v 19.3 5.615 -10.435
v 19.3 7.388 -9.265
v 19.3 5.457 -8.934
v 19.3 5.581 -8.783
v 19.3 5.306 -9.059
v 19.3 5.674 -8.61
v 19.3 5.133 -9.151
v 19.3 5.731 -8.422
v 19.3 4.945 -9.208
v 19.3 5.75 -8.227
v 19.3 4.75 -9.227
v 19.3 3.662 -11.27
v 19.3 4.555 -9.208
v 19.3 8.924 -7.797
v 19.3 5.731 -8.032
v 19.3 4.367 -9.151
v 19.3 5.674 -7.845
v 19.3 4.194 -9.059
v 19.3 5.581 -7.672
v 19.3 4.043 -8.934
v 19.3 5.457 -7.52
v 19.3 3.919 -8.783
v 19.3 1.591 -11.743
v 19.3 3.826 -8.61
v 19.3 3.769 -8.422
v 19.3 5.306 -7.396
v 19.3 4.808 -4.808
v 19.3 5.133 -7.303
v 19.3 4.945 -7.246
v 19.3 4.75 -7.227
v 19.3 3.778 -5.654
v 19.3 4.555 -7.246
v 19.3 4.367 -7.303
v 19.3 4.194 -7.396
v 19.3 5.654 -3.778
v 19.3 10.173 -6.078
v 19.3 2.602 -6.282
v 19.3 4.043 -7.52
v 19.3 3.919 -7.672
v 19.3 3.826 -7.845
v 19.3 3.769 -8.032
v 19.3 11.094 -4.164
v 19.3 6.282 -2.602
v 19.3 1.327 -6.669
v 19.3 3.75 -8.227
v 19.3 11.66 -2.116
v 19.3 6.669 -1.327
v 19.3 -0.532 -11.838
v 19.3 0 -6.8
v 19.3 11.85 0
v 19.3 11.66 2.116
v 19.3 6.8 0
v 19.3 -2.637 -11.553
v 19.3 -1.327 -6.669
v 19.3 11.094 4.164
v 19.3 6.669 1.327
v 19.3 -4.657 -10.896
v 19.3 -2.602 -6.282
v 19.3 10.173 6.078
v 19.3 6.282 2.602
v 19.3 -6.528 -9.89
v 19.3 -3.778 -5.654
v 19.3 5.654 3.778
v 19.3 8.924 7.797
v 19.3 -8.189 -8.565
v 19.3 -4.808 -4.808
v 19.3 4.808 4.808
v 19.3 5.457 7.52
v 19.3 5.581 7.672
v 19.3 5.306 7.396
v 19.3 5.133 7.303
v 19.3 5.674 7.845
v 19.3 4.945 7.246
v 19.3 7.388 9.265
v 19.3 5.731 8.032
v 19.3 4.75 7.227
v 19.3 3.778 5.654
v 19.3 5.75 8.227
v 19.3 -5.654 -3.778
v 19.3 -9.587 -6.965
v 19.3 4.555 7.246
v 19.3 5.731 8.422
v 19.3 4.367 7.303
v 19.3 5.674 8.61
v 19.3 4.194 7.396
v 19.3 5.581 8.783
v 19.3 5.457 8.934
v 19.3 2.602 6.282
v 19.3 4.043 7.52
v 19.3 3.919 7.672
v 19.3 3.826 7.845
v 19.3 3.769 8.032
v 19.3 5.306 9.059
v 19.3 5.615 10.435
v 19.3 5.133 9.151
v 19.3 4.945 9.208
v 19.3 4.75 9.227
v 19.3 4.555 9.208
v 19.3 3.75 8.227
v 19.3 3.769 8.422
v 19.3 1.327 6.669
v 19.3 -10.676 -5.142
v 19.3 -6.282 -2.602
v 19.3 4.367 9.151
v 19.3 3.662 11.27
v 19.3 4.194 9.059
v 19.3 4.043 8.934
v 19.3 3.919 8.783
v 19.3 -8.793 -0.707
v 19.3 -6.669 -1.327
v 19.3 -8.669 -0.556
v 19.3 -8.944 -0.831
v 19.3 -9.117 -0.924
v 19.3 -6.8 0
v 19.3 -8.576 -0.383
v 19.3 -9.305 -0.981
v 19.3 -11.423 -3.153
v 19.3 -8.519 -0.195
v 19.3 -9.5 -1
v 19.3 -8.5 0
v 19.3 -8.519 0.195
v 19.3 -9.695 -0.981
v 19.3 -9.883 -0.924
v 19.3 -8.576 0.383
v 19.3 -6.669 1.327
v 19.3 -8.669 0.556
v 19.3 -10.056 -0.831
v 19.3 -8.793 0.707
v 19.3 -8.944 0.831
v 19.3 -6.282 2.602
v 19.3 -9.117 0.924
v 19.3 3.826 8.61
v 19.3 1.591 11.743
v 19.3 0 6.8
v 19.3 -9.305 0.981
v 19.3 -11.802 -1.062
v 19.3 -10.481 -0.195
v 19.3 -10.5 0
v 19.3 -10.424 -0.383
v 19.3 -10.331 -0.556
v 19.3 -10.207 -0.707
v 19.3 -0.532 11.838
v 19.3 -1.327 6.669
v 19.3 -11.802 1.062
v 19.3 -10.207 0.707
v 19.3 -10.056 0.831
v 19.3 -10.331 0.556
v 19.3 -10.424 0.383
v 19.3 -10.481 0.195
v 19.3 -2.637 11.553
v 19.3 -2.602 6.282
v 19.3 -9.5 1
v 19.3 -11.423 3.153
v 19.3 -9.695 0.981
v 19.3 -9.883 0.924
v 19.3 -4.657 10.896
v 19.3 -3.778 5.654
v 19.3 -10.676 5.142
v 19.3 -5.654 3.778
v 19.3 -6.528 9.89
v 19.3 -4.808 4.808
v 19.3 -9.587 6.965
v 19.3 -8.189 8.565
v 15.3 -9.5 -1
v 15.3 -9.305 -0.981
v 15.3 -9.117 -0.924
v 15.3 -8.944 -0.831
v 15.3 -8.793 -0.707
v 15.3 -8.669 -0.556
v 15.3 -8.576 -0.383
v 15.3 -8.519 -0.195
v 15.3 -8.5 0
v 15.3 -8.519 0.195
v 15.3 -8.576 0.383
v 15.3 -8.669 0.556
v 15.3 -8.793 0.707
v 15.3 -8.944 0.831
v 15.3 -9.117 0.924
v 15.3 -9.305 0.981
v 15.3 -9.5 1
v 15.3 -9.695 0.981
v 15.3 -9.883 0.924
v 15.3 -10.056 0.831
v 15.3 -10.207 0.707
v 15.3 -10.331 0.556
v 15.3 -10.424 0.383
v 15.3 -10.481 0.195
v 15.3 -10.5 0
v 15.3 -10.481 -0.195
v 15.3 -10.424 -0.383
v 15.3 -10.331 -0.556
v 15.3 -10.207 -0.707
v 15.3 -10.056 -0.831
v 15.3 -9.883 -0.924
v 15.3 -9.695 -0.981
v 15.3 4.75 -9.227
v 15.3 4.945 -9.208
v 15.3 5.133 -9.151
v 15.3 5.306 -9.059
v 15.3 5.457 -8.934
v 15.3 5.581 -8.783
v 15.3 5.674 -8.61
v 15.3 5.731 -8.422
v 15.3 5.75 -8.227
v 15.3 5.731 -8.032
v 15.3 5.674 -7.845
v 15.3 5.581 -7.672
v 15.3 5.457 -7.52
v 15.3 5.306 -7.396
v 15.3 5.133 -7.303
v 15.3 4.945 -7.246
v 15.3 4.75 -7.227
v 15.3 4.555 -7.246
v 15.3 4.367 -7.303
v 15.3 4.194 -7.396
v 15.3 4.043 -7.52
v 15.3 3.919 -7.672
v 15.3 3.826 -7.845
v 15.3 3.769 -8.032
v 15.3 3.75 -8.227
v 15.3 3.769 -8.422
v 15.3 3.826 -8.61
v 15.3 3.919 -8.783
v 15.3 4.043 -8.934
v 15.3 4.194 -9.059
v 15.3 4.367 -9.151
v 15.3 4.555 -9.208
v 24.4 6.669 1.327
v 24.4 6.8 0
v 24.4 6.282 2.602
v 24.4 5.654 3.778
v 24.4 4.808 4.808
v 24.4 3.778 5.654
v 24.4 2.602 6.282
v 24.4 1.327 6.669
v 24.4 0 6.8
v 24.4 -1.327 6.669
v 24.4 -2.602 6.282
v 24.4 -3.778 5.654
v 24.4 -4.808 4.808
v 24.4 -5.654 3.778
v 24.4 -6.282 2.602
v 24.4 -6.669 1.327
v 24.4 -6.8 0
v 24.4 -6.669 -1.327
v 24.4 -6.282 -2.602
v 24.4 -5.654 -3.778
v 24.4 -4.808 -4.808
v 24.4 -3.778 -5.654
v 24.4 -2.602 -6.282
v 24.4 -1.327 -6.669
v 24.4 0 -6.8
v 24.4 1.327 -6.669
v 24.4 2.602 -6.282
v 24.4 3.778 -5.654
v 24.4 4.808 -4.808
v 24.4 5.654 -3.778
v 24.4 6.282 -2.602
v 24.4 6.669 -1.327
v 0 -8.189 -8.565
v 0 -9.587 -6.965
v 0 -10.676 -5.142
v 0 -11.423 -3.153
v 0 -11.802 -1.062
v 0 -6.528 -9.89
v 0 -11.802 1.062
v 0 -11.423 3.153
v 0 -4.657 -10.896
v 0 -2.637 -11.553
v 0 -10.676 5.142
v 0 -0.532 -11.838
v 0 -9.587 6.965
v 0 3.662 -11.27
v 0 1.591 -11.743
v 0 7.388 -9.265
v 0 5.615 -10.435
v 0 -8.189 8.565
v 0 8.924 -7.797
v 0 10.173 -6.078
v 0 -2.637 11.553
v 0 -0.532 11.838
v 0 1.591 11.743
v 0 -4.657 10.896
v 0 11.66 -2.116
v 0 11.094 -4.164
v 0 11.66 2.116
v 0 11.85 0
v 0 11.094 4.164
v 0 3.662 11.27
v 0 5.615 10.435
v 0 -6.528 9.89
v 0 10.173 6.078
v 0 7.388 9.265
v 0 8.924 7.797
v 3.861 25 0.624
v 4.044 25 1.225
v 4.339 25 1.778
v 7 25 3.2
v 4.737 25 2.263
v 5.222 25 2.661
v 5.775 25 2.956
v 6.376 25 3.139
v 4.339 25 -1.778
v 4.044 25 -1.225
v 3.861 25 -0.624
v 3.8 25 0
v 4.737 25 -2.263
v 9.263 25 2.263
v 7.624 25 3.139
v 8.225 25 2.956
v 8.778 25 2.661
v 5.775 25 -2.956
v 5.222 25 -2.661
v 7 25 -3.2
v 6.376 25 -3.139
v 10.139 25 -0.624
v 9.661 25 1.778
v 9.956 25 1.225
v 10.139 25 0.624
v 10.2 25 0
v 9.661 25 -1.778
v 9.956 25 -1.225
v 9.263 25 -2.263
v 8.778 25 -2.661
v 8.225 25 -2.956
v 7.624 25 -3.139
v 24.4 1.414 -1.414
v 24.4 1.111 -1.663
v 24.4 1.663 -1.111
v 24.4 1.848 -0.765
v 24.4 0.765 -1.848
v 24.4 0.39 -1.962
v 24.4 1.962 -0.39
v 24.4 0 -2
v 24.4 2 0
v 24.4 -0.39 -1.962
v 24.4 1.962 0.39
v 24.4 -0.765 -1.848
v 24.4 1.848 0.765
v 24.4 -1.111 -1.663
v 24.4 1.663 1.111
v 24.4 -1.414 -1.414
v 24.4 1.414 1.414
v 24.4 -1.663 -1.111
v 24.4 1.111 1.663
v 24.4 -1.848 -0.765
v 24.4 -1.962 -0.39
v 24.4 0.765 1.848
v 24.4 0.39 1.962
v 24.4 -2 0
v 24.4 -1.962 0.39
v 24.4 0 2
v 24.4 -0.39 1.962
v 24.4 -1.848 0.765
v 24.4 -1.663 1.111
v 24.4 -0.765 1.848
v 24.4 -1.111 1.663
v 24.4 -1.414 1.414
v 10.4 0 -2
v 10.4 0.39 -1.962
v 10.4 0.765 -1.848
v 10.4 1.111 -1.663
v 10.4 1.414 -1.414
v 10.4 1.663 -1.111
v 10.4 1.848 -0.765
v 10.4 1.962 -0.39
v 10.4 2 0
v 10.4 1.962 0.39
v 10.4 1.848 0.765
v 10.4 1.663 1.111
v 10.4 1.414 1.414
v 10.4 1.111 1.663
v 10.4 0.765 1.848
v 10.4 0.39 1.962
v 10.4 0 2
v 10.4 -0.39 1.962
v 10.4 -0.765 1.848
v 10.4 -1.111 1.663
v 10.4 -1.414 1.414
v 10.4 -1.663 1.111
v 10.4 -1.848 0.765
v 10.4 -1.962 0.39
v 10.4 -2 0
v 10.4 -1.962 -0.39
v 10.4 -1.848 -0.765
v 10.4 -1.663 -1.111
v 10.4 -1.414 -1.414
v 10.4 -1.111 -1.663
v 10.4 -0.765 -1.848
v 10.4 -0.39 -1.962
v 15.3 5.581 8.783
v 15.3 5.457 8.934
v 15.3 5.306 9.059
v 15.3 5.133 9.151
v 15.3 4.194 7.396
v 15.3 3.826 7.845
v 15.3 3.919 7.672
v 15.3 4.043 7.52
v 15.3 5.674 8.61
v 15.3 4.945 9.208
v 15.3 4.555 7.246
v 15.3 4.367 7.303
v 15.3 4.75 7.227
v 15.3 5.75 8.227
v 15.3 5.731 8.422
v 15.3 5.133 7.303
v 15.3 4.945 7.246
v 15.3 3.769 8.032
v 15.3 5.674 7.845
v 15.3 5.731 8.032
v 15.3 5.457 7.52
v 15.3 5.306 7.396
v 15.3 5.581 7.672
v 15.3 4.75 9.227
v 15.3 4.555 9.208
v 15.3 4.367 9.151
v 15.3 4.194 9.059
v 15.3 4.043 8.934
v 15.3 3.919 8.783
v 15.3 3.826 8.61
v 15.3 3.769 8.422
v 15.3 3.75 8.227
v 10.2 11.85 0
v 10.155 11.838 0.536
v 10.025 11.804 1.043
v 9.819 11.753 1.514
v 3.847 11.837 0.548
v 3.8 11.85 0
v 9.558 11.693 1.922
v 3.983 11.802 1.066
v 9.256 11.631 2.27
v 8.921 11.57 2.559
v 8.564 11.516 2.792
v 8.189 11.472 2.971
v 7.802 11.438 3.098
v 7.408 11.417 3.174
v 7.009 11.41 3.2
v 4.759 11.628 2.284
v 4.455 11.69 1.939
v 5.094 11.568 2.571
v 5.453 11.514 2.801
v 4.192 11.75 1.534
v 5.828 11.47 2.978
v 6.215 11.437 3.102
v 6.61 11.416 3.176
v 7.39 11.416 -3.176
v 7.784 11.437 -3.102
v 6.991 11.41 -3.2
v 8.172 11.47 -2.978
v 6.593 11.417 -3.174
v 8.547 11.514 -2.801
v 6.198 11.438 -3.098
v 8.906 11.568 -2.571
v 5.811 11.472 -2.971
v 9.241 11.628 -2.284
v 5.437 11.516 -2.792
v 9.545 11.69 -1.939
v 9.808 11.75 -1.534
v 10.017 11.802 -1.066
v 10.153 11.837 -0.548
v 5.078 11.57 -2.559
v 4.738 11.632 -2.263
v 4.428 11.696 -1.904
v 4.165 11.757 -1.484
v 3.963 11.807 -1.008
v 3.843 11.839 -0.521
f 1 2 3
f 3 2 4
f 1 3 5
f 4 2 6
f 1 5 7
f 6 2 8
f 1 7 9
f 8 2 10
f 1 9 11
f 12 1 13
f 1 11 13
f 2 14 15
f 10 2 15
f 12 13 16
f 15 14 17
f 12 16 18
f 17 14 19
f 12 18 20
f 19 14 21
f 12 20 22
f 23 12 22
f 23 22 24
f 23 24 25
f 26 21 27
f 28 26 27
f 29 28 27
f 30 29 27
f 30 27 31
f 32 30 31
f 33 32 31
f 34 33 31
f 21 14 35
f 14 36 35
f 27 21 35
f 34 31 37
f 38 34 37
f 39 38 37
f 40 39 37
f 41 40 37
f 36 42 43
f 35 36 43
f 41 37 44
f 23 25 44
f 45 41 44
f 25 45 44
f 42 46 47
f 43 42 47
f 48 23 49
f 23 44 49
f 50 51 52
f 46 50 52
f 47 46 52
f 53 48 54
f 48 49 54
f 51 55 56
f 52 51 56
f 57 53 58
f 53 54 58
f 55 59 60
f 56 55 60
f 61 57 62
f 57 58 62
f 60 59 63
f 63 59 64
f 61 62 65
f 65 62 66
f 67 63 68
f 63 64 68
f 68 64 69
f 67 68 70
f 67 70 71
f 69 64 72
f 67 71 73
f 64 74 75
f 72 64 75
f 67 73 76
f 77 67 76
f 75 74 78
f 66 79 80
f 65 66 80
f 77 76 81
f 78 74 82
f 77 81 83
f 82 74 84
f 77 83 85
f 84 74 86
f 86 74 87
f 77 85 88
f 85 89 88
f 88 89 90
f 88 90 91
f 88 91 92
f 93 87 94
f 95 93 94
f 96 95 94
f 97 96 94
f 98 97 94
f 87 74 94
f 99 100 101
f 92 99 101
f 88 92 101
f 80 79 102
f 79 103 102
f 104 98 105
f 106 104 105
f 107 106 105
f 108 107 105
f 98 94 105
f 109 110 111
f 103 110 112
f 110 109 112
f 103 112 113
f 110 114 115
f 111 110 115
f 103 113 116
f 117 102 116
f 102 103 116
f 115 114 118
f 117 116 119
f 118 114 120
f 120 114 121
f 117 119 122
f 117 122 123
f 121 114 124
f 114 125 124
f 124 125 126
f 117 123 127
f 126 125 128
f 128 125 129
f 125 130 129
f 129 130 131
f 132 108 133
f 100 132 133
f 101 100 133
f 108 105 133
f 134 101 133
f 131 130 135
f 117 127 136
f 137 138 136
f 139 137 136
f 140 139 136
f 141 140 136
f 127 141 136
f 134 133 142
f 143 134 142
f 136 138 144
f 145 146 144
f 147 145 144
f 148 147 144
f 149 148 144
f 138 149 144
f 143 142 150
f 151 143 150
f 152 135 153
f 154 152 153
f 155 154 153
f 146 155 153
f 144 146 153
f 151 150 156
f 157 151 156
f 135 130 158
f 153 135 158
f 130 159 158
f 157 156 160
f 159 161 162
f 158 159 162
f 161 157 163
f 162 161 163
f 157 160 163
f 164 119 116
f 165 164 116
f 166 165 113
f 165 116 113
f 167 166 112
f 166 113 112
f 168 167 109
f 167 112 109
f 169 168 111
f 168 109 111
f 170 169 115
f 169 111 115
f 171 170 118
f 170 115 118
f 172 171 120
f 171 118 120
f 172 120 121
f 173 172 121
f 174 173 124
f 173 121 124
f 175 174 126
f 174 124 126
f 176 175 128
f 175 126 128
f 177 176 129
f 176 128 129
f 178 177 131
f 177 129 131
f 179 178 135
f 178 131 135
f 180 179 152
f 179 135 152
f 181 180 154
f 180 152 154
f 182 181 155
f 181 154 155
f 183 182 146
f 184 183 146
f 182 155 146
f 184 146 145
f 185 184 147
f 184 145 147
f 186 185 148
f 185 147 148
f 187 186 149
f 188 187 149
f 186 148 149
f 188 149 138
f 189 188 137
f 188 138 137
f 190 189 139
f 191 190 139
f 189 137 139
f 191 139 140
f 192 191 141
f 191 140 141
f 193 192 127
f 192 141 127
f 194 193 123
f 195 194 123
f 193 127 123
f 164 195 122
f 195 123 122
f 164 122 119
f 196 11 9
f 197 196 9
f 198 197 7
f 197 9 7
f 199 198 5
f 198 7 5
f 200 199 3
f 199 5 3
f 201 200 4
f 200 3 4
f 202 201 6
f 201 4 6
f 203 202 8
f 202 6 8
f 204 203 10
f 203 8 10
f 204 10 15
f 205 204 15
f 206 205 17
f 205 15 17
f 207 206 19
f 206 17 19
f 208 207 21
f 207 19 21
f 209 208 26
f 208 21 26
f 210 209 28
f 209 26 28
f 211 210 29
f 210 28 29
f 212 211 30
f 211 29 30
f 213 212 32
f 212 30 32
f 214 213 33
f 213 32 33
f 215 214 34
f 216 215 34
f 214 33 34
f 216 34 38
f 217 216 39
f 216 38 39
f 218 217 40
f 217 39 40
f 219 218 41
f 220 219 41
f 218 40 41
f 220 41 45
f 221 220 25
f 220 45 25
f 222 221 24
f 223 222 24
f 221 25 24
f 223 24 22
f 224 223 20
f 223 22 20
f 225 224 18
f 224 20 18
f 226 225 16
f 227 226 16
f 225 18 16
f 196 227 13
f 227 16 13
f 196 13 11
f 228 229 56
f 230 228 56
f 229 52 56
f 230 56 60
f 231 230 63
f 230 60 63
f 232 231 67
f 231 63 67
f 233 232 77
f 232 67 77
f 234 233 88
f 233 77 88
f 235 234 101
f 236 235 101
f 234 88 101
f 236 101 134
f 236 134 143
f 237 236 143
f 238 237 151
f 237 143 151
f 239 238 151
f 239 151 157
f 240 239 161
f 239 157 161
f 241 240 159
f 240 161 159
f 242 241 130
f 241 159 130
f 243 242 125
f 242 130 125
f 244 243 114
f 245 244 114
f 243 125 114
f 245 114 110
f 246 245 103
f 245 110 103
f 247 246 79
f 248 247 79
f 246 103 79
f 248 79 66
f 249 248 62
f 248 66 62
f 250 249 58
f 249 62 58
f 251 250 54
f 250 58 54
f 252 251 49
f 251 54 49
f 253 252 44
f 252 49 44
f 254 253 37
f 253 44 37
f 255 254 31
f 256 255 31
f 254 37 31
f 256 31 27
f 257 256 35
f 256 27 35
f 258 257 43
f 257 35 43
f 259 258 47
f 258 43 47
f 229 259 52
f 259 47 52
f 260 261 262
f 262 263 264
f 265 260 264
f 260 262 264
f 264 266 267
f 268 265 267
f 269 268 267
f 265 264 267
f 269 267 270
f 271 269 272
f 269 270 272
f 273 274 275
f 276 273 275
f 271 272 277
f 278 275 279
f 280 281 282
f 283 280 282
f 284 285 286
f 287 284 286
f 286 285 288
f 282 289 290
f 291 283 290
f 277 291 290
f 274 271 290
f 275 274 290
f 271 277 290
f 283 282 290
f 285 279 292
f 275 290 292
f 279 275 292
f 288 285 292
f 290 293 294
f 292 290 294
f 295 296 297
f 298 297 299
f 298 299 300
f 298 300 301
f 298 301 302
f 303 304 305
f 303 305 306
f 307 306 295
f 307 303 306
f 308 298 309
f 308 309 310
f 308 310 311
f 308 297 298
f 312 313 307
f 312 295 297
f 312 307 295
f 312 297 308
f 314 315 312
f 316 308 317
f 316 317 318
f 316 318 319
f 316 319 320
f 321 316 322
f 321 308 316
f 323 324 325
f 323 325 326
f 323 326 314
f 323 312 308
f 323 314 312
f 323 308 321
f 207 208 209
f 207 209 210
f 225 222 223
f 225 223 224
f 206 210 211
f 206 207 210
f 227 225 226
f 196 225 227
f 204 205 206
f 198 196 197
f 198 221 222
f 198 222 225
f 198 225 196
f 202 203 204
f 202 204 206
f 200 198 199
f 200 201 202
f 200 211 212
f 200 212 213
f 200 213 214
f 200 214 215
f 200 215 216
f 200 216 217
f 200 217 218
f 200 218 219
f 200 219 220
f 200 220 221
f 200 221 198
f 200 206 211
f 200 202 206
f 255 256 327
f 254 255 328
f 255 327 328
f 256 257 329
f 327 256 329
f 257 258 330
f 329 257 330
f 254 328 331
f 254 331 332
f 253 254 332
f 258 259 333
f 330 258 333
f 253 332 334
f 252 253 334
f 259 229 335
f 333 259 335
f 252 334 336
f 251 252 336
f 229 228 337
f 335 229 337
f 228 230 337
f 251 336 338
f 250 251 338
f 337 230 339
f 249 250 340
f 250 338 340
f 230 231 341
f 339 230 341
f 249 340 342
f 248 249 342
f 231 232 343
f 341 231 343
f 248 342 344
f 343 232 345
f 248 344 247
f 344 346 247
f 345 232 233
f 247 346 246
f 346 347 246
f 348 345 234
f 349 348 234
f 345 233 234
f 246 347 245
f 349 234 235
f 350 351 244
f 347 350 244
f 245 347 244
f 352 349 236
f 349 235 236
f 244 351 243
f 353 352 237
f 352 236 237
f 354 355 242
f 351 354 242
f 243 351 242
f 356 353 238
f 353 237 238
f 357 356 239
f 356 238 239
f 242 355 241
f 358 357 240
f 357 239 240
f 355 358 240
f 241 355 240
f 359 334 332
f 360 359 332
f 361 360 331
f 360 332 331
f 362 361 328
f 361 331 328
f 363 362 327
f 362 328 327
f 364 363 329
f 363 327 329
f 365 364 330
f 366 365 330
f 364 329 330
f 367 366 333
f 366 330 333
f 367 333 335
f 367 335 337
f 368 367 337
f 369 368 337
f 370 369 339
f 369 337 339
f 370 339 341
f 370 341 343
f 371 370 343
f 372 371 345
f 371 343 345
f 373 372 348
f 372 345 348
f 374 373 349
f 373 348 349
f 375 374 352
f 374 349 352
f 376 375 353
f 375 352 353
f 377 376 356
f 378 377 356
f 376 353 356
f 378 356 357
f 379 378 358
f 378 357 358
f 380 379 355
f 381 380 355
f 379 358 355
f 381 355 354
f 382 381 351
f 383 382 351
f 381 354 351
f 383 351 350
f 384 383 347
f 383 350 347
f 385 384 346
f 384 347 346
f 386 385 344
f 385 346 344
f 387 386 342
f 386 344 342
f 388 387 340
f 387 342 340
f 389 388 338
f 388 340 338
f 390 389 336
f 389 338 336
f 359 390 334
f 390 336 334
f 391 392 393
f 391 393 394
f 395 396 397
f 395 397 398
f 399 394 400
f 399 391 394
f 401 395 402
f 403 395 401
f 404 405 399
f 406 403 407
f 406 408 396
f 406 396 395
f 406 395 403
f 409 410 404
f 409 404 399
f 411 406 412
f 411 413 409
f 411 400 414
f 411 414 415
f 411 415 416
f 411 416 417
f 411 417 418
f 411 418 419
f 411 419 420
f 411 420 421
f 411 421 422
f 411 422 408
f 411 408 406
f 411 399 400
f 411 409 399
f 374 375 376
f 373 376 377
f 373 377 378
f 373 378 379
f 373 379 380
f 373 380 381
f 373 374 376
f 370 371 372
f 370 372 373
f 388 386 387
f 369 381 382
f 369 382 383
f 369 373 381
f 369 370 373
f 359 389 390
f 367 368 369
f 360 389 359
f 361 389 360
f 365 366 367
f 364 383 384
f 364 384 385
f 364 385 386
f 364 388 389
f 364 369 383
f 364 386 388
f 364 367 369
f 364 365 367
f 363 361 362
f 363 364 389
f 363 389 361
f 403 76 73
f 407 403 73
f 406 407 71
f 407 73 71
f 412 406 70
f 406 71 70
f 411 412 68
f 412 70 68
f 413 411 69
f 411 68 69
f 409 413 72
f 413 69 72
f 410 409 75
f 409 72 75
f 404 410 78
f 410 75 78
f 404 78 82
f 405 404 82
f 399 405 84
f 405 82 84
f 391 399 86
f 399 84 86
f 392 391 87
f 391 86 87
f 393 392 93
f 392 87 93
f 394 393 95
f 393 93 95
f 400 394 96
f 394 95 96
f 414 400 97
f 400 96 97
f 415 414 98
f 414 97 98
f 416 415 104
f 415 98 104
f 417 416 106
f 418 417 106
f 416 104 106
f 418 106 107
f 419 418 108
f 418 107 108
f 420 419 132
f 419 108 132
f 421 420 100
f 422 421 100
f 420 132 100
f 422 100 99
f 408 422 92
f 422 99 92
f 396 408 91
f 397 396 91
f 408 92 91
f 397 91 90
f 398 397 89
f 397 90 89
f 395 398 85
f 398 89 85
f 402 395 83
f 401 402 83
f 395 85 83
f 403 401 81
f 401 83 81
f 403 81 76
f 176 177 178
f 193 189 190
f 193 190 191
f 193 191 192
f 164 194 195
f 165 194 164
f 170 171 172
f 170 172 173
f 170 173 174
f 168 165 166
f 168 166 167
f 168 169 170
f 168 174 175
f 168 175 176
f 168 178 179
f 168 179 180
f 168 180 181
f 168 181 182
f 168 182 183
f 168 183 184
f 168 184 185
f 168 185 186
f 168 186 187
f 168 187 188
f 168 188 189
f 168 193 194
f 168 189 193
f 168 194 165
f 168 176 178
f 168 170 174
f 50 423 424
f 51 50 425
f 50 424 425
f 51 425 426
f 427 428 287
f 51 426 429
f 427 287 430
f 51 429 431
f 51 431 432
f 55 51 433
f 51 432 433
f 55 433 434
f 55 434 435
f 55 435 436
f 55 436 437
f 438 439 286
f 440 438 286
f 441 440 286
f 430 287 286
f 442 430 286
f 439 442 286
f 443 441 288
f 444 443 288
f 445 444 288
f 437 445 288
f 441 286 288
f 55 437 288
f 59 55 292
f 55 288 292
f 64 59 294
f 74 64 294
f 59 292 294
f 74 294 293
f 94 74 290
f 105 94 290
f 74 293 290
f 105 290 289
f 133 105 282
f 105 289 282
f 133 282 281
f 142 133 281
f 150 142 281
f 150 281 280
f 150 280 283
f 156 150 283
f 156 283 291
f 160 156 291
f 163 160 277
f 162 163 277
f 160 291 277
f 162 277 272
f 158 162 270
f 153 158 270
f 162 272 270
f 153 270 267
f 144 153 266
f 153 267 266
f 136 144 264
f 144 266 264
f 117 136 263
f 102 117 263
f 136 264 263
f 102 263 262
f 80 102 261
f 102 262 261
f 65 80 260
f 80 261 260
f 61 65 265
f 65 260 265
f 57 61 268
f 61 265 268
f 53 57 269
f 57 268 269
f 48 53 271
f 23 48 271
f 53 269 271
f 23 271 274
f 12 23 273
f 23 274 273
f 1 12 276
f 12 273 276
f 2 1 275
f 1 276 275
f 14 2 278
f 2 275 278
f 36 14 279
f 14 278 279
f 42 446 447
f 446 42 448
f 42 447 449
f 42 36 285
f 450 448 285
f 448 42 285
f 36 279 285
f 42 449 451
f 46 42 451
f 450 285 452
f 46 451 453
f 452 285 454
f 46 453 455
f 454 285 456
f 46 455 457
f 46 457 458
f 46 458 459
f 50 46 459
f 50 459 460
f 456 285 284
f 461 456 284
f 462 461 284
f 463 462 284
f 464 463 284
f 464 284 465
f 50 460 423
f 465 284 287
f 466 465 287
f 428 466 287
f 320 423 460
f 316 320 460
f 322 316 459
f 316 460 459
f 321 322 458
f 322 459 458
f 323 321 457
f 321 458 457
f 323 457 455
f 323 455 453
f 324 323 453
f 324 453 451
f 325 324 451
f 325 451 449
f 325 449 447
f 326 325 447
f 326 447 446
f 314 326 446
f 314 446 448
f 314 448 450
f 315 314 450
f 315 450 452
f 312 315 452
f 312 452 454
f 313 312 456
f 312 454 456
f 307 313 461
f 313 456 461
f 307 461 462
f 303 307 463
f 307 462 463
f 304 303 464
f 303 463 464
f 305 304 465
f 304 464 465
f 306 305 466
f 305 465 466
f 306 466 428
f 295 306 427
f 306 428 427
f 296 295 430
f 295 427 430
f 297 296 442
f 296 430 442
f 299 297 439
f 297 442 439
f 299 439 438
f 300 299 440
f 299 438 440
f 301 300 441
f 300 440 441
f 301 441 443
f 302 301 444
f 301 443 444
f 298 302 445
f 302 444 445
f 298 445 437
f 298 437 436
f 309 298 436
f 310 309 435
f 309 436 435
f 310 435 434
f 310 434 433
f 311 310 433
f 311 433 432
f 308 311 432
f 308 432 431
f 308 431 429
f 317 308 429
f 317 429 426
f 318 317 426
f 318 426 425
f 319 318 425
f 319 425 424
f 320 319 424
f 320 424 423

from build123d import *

# Parameters (mm, degrees)
ESQUISSE2_R             = 3.2
BOSS_EXTRU_1_DEPTH      = 25
ESQUISSE3_R             = 2
ENL_V_MAT_EXTRU_1_DEPTH = 14
ESQUISSE4_R             = 1
ENL_V_MAT_EXTRU_2_DEPTH = 4


with BuildPart() as part:
    # Esquisse1 → Révolution2 (revolve)
    with BuildSketch(Plane.XY):
        Polygon((0, 0), (24.4, 0), (24.4, 6.8), (19.3, 6.8), (19.3, 11.85), (0, 11.85), align=None)
    revolve(axis=Axis((0, 0, 0), (1, 0, 0)))

    # Esquisse2 → Boss.-Extru.1 (add)
    with BuildSketch(Plane(origin=(0, 0, 0), x_dir=(1, 0, 0), z_dir=(0, 1, 0))):
        with Locations((7, 0)):
            Circle(ESQUISSE2_R)
    extrude(amount=BOSS_EXTRU_1_DEPTH)

    # Esquisse3 → Enlèv. mat.-Extru.1 (cut)
    with BuildSketch(Plane(origin=(24.4, 0, 0), x_dir=(0, 0, -1), z_dir=(1, 0, 0))):
        Circle(ESQUISSE3_R)
    extrude(amount=-ENL_V_MAT_EXTRU_1_DEPTH, mode=Mode.SUBTRACT)

    # Esquisse4 → Enlèv. mat.-Extru.2 (cut)
    with BuildSketch(Plane(origin=(19.3, 0, 0), x_dir=(0, 0, -1), z_dir=(1, 0, 0))):
        with Locations((0, -9.5)):
            Circle(ESQUISSE4_R)
        with Locations((-8.227241336, 4.75)):
            Circle(ESQUISSE4_R)
        with Locations((8.227241336, 4.75)):
            Circle(ESQUISSE4_R)
    extrude(amount=-ENL_V_MAT_EXTRU_2_DEPTH, mode=Mode.SUBTRACT)


solid = part.part
